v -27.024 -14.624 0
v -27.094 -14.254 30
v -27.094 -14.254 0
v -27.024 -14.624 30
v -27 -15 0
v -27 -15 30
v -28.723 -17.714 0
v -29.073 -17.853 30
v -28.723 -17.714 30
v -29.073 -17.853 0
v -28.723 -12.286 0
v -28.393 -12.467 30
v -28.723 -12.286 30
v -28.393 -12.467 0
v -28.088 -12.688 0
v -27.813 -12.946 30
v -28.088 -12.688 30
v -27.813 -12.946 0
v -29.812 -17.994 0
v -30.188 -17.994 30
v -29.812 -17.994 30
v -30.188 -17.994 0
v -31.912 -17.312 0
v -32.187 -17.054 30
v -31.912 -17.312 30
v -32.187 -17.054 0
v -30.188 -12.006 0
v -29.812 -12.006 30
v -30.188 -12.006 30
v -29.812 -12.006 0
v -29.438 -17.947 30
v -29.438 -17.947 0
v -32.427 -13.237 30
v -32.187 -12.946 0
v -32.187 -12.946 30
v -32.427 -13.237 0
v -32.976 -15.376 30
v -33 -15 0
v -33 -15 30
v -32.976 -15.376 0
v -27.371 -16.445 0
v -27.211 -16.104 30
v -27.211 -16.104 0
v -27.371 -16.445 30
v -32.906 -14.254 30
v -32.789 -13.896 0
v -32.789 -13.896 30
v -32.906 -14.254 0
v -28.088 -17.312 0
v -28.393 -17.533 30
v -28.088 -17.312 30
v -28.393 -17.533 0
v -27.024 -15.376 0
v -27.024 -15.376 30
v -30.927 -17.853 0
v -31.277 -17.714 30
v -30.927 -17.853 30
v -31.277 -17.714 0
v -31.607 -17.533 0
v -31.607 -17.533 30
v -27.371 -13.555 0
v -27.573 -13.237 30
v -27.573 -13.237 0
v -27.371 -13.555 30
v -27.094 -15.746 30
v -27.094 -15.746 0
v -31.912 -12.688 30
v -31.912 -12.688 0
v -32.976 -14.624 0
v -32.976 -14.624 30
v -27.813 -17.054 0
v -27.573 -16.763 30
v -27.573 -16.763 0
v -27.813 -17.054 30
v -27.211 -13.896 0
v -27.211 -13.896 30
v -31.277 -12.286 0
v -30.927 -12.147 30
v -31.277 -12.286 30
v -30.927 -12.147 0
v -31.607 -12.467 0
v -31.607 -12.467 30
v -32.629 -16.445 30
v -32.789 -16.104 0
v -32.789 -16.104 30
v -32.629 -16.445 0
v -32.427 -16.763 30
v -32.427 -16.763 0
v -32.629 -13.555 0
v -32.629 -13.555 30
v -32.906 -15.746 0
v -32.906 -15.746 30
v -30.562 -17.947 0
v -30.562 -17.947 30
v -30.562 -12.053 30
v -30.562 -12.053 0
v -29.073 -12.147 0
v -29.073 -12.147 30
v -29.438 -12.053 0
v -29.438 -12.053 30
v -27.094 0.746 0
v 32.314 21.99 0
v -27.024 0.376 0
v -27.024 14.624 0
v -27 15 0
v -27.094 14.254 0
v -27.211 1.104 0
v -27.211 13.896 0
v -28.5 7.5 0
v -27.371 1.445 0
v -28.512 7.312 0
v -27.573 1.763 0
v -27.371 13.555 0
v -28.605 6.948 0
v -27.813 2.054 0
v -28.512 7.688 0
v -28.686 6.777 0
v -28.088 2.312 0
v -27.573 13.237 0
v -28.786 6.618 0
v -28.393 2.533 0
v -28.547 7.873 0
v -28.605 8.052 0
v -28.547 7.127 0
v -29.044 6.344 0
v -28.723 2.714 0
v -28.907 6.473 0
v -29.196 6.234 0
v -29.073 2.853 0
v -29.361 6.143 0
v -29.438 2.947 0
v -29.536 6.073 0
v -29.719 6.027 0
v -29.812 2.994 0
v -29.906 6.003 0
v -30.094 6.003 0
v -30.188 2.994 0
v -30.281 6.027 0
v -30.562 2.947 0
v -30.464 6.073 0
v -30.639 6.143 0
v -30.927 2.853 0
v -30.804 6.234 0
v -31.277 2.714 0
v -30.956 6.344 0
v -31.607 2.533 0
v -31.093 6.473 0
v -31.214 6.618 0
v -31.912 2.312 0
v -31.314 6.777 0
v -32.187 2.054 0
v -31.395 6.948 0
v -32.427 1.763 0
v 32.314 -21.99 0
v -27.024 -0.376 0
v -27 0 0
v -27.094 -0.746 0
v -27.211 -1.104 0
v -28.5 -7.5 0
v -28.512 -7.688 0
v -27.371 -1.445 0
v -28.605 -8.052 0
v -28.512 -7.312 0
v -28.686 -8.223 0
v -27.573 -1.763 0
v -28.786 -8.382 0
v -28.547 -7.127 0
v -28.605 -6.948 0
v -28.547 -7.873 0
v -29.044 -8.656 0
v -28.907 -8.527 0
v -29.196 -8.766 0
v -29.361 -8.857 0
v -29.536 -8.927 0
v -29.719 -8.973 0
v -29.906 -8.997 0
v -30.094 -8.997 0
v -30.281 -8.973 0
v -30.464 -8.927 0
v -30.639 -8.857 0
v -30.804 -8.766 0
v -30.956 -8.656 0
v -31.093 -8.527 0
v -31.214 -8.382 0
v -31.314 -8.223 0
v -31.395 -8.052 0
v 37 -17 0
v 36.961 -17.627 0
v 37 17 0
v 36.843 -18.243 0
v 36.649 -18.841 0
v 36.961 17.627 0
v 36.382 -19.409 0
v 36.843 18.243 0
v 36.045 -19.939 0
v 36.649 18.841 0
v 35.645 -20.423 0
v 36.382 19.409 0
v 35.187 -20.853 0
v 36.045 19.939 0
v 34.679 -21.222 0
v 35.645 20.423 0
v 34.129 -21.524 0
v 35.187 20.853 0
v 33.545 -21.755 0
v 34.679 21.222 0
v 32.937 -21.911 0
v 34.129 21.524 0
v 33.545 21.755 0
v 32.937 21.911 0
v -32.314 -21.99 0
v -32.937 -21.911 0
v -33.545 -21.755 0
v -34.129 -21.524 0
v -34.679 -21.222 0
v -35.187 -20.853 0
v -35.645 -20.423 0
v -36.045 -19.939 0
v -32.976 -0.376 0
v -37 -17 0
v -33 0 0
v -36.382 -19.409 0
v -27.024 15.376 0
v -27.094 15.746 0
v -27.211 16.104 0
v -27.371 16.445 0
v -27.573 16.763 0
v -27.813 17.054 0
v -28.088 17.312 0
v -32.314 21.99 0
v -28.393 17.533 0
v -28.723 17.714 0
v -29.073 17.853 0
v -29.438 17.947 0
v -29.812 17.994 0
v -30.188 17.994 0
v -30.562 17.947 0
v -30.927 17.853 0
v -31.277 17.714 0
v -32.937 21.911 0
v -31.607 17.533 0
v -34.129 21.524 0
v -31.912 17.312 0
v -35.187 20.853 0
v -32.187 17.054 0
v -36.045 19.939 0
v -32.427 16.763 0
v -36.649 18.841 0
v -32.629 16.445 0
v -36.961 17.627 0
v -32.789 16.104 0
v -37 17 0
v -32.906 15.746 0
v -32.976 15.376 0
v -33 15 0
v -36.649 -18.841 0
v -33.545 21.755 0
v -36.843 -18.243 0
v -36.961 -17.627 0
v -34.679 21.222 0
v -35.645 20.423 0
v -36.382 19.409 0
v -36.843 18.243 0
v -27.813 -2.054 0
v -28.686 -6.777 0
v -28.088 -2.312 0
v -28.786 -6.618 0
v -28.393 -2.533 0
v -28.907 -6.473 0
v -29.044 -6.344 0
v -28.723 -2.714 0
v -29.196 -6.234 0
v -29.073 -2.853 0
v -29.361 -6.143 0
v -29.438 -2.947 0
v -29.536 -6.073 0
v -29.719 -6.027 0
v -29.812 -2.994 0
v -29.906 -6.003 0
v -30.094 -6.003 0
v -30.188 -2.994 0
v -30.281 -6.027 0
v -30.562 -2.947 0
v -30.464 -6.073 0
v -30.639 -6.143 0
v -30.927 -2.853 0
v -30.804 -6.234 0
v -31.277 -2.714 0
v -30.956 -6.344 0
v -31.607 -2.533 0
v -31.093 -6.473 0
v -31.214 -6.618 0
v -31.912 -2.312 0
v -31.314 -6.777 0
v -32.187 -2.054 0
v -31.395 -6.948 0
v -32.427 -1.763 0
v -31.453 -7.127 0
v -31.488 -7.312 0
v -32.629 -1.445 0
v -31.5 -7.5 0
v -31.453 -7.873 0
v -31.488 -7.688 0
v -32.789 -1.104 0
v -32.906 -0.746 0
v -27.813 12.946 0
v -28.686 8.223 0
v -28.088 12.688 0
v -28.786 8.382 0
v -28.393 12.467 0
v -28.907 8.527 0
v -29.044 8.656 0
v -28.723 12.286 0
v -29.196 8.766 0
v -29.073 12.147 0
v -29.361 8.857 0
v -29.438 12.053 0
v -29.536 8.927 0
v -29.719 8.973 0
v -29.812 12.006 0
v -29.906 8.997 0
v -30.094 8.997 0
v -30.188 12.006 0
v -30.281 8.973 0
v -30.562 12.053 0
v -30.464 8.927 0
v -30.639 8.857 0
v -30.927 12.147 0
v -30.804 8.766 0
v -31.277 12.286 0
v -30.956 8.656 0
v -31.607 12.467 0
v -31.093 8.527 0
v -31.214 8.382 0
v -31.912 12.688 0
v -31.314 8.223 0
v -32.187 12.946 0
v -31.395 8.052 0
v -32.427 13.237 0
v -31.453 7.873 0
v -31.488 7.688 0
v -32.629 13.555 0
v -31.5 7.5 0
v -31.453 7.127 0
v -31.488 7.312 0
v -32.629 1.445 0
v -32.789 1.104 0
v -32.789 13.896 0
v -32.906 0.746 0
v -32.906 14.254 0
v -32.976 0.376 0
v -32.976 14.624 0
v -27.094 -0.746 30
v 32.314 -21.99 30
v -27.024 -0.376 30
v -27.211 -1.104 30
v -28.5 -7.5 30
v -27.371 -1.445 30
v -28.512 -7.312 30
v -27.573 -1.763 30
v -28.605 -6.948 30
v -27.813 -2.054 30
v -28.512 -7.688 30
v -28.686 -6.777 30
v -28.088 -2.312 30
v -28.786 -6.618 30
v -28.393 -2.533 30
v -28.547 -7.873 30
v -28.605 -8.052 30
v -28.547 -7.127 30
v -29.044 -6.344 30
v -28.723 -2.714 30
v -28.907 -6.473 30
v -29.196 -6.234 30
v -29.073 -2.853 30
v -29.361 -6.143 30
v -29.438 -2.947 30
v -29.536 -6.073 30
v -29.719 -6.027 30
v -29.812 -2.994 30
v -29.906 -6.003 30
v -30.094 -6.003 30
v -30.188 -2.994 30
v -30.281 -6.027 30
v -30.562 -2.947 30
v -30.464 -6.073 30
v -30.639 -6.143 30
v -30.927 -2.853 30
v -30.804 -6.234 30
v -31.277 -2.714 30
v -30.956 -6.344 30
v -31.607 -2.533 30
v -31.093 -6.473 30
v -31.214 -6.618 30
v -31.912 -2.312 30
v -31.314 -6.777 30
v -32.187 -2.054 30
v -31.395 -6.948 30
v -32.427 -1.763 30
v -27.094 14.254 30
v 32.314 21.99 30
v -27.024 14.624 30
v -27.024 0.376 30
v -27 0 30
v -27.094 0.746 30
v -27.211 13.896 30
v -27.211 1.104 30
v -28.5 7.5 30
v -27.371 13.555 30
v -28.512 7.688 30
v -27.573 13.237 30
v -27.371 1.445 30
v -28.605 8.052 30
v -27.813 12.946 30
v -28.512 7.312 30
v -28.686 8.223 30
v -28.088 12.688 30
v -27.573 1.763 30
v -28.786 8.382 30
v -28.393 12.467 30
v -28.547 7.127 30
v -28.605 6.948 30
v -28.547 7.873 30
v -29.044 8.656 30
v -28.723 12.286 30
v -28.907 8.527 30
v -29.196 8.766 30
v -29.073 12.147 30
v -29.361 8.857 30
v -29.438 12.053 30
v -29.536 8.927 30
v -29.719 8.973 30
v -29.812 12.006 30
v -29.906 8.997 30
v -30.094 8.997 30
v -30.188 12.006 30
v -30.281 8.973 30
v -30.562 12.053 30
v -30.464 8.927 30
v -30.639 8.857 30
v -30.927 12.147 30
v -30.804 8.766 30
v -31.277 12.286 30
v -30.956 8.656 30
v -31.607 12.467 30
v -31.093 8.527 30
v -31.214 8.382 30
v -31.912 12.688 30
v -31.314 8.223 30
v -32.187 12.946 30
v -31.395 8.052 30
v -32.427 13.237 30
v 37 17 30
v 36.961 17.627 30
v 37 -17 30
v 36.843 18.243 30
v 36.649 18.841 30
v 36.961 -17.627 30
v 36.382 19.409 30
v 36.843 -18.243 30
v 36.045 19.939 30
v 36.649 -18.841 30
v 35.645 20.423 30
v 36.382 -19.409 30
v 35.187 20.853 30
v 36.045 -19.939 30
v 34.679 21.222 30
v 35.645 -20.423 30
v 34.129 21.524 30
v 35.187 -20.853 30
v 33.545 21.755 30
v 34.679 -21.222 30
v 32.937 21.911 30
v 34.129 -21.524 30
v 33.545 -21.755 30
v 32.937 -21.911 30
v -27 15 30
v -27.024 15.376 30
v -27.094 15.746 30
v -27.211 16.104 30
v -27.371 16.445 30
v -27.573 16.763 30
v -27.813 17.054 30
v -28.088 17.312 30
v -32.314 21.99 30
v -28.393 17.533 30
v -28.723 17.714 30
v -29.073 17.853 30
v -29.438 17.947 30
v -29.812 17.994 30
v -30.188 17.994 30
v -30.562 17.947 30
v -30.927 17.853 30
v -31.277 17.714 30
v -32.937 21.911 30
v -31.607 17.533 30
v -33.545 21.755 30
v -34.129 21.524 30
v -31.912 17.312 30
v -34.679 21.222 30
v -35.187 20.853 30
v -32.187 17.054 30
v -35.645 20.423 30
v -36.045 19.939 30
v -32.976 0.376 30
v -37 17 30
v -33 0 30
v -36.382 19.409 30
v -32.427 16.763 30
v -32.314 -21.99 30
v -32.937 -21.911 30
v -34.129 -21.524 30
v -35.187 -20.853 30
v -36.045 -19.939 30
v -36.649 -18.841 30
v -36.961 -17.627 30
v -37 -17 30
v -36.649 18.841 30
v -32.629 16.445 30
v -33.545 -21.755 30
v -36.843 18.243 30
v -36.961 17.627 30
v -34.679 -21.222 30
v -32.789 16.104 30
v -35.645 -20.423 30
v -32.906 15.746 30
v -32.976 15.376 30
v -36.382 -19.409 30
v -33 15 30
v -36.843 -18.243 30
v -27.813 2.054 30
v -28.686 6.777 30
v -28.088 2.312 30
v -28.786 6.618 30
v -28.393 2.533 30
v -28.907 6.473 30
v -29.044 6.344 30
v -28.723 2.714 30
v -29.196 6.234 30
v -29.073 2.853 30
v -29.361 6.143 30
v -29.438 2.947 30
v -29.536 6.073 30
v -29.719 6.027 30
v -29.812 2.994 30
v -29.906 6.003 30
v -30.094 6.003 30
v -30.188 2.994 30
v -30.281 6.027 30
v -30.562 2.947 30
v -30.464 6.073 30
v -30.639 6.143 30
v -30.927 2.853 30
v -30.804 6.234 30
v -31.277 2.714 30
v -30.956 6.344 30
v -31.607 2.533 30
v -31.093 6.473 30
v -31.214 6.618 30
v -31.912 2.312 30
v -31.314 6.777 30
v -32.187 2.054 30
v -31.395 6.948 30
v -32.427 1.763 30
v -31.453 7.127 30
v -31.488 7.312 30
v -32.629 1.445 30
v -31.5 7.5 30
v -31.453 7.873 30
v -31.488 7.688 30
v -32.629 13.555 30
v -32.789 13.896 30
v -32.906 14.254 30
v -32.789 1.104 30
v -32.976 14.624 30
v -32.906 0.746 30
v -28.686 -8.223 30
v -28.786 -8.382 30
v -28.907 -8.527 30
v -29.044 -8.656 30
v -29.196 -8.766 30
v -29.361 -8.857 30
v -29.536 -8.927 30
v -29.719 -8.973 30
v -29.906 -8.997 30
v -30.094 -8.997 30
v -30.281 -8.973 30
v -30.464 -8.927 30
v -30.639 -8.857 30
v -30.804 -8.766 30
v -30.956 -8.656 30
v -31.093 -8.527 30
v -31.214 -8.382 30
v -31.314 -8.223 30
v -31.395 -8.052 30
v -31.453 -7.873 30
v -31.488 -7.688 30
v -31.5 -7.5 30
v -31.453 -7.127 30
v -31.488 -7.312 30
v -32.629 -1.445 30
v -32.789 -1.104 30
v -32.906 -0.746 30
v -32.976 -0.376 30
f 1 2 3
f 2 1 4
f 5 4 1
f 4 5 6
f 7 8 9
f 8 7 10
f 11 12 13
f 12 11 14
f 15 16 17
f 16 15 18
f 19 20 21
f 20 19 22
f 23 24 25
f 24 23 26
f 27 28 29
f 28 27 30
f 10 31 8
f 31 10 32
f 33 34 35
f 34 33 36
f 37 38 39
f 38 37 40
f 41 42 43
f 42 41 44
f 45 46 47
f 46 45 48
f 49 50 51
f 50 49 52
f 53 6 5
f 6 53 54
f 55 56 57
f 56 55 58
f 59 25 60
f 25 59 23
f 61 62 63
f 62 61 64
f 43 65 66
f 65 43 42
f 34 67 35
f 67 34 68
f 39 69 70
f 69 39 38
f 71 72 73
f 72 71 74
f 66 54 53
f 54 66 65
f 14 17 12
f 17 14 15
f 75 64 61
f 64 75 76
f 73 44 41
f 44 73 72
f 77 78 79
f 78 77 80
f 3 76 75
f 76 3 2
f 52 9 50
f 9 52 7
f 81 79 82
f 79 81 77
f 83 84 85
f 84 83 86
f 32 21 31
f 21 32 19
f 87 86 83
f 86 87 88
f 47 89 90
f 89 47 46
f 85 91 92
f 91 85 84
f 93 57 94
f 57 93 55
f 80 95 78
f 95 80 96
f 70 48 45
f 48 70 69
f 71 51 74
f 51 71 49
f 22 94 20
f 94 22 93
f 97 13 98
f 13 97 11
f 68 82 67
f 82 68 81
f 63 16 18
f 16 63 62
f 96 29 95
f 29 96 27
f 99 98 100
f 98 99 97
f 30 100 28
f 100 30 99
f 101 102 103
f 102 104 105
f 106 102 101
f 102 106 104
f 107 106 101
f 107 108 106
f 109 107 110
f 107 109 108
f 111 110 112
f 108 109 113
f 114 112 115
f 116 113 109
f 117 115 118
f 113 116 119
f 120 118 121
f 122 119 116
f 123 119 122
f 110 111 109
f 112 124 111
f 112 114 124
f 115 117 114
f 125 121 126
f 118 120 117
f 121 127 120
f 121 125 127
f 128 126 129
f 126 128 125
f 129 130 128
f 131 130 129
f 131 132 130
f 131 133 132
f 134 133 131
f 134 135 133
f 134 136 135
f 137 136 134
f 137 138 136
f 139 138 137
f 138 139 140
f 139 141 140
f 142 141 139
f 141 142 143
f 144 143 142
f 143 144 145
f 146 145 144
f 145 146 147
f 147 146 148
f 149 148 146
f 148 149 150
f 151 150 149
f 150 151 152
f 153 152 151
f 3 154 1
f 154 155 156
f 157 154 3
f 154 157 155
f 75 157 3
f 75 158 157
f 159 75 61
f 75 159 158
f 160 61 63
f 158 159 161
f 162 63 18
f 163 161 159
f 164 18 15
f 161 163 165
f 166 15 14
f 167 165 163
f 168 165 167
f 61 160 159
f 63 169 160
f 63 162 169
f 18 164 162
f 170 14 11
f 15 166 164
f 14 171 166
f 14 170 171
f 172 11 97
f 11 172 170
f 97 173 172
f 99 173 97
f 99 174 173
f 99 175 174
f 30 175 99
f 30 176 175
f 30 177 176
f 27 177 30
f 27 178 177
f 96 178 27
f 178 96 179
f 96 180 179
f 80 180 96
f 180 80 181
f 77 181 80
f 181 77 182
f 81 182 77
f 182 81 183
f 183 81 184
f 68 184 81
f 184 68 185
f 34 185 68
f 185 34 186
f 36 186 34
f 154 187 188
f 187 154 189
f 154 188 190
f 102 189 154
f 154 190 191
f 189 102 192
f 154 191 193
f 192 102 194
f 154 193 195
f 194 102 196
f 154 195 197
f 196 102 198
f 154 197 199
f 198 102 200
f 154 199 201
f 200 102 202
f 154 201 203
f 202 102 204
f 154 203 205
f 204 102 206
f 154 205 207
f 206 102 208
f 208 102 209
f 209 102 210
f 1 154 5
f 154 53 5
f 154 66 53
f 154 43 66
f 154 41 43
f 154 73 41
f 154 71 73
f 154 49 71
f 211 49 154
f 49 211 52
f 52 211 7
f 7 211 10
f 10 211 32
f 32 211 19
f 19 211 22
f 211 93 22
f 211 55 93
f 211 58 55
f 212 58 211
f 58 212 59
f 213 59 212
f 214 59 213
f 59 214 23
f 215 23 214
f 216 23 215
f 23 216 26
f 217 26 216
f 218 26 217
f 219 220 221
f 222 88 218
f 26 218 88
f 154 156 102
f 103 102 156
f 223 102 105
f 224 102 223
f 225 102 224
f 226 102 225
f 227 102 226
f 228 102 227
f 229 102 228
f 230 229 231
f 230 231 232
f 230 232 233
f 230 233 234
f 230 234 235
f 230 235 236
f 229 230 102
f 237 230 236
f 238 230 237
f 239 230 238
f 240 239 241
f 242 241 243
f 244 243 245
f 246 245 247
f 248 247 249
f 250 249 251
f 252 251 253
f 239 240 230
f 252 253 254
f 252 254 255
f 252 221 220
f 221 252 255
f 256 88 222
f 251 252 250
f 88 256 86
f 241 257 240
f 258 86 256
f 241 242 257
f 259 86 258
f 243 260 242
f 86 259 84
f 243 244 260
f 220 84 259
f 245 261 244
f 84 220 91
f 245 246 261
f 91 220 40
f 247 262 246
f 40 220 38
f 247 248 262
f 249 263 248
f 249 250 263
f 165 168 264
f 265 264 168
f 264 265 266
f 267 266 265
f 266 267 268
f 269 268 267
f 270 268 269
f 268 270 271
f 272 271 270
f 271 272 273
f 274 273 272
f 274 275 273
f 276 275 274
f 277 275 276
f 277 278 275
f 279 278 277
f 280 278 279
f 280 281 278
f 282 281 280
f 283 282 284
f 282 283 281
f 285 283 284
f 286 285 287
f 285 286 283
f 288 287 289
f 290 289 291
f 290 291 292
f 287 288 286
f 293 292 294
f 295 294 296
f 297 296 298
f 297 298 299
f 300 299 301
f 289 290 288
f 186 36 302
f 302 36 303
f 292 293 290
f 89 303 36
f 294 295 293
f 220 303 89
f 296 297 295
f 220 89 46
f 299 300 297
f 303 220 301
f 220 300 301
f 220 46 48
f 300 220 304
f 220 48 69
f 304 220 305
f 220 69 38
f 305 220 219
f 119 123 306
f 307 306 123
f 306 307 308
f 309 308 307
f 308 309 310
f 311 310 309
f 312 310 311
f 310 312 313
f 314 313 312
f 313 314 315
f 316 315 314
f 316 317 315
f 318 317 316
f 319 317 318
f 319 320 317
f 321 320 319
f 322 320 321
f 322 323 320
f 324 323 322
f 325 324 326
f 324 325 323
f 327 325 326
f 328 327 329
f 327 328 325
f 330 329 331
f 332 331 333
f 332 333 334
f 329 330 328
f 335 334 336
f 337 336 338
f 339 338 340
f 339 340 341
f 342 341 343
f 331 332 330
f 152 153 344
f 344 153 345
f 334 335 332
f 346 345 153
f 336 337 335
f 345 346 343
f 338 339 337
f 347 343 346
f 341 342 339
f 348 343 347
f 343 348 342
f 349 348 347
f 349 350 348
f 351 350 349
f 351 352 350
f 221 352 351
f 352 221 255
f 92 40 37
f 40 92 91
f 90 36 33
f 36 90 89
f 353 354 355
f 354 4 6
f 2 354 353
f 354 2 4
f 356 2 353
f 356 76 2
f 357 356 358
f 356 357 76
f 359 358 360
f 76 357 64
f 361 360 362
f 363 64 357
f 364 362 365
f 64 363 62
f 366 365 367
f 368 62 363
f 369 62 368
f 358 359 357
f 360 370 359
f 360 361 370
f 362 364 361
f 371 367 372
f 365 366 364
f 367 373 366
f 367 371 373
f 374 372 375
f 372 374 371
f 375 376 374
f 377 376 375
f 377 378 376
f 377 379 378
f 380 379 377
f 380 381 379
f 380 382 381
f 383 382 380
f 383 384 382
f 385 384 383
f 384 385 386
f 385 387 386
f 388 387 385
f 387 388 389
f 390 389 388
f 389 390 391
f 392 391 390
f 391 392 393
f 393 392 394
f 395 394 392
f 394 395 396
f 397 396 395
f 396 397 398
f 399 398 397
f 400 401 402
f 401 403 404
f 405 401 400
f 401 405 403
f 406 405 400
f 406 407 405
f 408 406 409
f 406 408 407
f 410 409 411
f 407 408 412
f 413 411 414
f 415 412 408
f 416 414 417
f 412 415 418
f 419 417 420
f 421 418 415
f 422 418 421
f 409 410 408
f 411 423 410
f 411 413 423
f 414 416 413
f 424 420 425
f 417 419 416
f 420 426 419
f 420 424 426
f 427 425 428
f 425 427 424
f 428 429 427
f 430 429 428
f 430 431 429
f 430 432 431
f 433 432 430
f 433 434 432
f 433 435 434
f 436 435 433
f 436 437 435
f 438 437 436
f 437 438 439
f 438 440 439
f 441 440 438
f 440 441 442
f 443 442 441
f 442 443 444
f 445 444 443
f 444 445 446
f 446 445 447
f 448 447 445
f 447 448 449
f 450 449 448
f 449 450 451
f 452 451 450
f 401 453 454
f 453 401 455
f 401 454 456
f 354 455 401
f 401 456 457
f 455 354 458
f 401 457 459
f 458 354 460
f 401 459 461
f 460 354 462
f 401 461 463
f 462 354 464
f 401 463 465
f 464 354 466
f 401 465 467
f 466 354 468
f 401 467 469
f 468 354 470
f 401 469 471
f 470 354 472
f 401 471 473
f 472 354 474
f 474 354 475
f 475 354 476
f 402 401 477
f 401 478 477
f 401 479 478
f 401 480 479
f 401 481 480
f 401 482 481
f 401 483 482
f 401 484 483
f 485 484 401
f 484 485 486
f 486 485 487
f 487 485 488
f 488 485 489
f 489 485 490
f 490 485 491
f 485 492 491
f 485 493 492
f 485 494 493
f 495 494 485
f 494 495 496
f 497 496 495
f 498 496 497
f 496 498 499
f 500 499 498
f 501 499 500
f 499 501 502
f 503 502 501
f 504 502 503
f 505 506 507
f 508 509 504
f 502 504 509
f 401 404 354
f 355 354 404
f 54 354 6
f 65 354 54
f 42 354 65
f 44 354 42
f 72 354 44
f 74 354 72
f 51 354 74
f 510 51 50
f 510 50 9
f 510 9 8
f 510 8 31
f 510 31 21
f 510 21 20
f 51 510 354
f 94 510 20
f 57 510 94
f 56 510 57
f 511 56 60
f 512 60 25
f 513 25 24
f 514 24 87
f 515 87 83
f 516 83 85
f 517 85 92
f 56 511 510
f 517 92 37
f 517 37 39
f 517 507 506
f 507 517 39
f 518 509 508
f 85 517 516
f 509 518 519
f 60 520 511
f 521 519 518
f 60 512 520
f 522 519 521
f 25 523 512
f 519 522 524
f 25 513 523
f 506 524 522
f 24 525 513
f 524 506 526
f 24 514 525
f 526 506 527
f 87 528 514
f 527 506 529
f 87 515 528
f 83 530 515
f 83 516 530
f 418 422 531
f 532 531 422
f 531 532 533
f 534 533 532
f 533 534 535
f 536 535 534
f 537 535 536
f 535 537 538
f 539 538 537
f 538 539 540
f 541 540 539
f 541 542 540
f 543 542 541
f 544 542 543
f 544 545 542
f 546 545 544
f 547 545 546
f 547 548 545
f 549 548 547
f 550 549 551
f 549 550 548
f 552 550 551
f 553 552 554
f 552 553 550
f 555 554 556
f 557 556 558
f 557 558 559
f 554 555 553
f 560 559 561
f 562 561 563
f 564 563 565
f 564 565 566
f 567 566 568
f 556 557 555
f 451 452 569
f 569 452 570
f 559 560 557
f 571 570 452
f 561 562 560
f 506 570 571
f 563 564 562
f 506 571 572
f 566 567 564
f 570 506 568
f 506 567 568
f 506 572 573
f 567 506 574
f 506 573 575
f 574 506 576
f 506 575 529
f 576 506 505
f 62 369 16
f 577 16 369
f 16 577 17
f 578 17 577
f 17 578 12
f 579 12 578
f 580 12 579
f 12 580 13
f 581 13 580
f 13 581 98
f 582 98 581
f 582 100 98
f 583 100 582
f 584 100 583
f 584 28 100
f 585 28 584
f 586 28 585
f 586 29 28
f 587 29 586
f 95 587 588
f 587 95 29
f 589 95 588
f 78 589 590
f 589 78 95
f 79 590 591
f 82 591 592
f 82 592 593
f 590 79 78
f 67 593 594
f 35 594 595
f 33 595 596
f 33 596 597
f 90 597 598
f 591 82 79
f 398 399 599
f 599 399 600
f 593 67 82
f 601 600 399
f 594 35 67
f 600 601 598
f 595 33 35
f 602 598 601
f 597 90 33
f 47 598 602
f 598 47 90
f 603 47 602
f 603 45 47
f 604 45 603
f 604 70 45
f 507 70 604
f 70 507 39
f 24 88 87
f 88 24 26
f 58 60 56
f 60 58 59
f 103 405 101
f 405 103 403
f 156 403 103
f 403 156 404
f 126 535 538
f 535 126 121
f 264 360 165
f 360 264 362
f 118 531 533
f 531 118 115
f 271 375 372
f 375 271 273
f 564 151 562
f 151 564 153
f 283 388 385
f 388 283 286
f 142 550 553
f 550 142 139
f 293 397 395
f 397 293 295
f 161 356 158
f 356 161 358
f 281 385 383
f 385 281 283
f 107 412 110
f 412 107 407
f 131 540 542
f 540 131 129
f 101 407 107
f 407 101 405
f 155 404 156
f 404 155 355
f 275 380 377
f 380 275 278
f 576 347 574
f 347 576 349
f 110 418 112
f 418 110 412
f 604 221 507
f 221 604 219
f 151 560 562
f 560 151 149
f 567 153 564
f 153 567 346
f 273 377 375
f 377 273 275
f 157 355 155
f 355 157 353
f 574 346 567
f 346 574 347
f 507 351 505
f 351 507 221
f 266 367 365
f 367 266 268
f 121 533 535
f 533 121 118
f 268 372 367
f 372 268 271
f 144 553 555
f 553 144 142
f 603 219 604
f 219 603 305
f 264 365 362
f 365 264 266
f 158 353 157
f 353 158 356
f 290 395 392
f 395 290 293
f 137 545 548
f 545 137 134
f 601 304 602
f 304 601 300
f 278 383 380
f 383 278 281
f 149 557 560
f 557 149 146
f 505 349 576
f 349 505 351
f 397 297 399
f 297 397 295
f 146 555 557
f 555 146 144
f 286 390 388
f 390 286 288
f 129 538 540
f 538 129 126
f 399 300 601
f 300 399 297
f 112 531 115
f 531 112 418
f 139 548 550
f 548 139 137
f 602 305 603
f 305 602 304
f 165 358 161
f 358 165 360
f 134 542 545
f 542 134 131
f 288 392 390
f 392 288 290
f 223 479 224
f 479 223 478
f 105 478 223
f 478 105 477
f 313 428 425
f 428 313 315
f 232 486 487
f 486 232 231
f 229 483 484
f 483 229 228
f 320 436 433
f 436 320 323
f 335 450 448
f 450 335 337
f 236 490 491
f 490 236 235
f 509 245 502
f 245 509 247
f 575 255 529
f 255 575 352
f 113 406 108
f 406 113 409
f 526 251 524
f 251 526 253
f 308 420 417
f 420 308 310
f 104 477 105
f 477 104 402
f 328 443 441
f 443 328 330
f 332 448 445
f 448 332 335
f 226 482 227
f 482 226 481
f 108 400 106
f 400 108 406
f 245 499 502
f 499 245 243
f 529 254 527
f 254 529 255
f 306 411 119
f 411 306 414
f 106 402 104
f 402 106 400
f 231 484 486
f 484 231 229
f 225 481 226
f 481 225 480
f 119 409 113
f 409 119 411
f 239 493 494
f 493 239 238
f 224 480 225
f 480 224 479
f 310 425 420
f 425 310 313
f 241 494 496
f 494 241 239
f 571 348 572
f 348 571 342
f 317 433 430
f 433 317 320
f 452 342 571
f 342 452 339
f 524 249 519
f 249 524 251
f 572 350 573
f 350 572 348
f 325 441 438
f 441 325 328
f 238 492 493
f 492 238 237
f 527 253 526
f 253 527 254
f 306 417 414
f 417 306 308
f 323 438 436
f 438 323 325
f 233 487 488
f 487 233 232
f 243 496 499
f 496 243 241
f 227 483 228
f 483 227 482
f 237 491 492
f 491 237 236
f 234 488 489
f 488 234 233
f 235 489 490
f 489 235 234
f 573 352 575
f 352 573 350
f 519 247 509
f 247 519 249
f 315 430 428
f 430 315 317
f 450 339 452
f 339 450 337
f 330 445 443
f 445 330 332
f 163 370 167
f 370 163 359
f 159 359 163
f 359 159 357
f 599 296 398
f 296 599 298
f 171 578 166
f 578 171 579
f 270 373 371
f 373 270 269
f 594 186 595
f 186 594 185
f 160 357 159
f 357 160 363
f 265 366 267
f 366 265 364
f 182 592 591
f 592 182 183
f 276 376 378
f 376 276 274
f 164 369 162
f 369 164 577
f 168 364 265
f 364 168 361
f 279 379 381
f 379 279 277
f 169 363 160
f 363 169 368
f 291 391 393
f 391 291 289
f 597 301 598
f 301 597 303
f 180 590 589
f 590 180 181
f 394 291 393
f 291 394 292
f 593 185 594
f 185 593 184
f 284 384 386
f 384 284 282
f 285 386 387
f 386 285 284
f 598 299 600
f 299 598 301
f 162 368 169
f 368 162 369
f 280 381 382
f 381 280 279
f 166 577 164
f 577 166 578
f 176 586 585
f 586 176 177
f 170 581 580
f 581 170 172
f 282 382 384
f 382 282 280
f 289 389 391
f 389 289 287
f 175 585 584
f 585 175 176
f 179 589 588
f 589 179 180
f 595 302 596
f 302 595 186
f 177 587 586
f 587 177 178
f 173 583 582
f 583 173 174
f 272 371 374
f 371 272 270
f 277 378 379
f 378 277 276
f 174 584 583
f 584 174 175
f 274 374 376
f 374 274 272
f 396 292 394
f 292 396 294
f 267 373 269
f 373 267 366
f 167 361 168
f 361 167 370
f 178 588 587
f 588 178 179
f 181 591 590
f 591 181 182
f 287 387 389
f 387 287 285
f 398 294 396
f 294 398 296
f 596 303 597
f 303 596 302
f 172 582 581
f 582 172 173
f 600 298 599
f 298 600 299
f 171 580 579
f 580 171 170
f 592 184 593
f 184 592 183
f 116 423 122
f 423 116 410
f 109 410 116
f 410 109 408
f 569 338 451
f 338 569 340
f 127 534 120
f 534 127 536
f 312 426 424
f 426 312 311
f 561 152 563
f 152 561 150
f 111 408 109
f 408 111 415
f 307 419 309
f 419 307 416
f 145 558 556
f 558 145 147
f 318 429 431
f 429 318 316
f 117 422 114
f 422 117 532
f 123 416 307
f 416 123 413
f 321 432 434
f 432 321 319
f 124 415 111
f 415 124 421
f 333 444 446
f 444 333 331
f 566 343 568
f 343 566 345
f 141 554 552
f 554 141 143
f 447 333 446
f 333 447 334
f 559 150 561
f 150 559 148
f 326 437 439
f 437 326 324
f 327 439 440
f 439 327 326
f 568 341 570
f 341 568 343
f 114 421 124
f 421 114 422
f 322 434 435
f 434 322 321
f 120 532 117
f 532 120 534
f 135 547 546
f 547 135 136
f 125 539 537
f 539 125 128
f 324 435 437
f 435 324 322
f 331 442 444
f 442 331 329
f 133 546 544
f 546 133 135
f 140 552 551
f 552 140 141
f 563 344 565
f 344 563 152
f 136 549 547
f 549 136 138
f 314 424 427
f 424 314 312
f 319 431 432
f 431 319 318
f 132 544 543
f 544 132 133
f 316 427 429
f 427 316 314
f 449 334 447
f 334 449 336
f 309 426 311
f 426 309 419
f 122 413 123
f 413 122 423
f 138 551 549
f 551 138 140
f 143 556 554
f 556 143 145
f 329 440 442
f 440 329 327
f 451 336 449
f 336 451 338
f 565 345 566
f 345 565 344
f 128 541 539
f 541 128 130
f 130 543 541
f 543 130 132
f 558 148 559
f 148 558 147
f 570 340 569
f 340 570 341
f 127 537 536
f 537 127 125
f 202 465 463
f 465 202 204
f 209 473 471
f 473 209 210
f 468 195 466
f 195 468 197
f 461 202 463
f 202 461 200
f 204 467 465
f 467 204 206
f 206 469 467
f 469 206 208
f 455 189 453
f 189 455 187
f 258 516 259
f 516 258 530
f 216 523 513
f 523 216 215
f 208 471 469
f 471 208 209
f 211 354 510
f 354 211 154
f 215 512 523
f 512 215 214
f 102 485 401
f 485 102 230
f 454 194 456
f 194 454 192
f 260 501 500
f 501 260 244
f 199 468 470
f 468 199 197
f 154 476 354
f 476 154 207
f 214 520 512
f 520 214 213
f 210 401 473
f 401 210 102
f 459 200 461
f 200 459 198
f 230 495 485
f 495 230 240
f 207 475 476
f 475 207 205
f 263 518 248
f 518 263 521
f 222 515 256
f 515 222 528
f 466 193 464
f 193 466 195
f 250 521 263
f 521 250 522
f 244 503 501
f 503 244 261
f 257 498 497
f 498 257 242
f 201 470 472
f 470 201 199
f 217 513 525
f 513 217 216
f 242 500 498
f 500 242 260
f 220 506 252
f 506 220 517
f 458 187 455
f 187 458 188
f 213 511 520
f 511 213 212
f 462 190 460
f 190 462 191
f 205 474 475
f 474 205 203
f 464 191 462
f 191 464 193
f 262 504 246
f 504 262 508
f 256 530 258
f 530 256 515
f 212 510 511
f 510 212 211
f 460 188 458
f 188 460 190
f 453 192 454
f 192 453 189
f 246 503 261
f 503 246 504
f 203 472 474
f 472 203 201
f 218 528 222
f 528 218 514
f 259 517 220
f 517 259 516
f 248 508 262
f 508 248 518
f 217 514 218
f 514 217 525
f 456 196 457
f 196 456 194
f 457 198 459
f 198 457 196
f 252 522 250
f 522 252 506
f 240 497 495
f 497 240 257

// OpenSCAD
$fn = 50;


difference() {
	union() {
		hull() {
			translate(v = [-32.0000000000, 17.0000000000, 0]) {
				cylinder(h = 30, r = 5);
			}
			translate(v = [32.0000000000, 17.0000000000, 0]) {
				cylinder(h = 30, r = 5);
			}
			translate(v = [-32.0000000000, -17.0000000000, 0]) {
				cylinder(h = 30, r = 5);
			}
			translate(v = [32.0000000000, -17.0000000000, 0]) {
				cylinder(h = 30, r = 5);
			}
		}
	}
	union() {
		translate(v = [-30.0000000000, -15.0000000000, 0]) {
			cylinder(h = 30, r = 3.0000000000);
		}
		translate(v = [-30.0000000000, 0.0000000000, 0]) {
			cylinder(h = 30, r = 3.0000000000);
		}
		translate(v = [-30.0000000000, 15.0000000000, 0]) {
			cylinder(h = 30, r = 3.0000000000);
		}
		translate(v = [-30.0000000000, -15.0000000000, 0]) {
			cylinder(h = 30, r = 1.5000000000);
		}
		translate(v = [-30.0000000000, -7.5000000000, 0]) {
			cylinder(h = 30, r = 1.5000000000);
		}
		translate(v = [-30.0000000000, 0.0000000000, 0]) {
			cylinder(h = 30, r = 1.5000000000);
		}
		translate(v = [-30.0000000000, 7.5000000000, 0]) {
			cylinder(h = 30, r = 1.5000000000);
		}
		translate(v = [-30.0000000000, 15.0000000000, 0]) {
			cylinder(h = 30, r = 1.5000000000);
		}
		translate(v = [-30.0000000000, -15.0000000000, 0]) {
			cylinder(h = 30, r = 1.5000000000);
		}
		translate(v = [-30.0000000000, -7.5000000000, 0]) {
			cylinder(h = 30, r = 1.5000000000);
		}
		translate(v = [-30.0000000000, 0.0000000000, 0]) {
			cylinder(h = 30, r = 1.5000000000);
		}
		translate(v = [-30.0000000000, 7.5000000000, 0]) {
			cylinder(h = 30, r = 1.5000000000);
		}
		translate(v = [-30.0000000000, 15.0000000000, 0]) {
			cylinder(h = 30, r = 1.5000000000);
		}
		translate(v = [-30.0000000000, -15.0000000000, 0]) {
			cylinder(h = 30, r = 1.5000000000);
		}
		translate(v = [-30.0000000000, -7.5000000000, 0]) {
			cylinder(h = 30, r = 1.5000000000);
		}
		translate(v = [-30.0000000000, 0.0000000000, 0]) {
			cylinder(h = 30, r = 1.5000000000);
		}
		translate(v = [-30.0000000000, 7.5000000000, 0]) {
			cylinder(h = 30, r = 1.5000000000);
		}
		translate(v = [-30.0000000000, 15.0000000000, 0]) {
			cylinder(h = 30, r = 1.5000000000);
		}
	}
}
